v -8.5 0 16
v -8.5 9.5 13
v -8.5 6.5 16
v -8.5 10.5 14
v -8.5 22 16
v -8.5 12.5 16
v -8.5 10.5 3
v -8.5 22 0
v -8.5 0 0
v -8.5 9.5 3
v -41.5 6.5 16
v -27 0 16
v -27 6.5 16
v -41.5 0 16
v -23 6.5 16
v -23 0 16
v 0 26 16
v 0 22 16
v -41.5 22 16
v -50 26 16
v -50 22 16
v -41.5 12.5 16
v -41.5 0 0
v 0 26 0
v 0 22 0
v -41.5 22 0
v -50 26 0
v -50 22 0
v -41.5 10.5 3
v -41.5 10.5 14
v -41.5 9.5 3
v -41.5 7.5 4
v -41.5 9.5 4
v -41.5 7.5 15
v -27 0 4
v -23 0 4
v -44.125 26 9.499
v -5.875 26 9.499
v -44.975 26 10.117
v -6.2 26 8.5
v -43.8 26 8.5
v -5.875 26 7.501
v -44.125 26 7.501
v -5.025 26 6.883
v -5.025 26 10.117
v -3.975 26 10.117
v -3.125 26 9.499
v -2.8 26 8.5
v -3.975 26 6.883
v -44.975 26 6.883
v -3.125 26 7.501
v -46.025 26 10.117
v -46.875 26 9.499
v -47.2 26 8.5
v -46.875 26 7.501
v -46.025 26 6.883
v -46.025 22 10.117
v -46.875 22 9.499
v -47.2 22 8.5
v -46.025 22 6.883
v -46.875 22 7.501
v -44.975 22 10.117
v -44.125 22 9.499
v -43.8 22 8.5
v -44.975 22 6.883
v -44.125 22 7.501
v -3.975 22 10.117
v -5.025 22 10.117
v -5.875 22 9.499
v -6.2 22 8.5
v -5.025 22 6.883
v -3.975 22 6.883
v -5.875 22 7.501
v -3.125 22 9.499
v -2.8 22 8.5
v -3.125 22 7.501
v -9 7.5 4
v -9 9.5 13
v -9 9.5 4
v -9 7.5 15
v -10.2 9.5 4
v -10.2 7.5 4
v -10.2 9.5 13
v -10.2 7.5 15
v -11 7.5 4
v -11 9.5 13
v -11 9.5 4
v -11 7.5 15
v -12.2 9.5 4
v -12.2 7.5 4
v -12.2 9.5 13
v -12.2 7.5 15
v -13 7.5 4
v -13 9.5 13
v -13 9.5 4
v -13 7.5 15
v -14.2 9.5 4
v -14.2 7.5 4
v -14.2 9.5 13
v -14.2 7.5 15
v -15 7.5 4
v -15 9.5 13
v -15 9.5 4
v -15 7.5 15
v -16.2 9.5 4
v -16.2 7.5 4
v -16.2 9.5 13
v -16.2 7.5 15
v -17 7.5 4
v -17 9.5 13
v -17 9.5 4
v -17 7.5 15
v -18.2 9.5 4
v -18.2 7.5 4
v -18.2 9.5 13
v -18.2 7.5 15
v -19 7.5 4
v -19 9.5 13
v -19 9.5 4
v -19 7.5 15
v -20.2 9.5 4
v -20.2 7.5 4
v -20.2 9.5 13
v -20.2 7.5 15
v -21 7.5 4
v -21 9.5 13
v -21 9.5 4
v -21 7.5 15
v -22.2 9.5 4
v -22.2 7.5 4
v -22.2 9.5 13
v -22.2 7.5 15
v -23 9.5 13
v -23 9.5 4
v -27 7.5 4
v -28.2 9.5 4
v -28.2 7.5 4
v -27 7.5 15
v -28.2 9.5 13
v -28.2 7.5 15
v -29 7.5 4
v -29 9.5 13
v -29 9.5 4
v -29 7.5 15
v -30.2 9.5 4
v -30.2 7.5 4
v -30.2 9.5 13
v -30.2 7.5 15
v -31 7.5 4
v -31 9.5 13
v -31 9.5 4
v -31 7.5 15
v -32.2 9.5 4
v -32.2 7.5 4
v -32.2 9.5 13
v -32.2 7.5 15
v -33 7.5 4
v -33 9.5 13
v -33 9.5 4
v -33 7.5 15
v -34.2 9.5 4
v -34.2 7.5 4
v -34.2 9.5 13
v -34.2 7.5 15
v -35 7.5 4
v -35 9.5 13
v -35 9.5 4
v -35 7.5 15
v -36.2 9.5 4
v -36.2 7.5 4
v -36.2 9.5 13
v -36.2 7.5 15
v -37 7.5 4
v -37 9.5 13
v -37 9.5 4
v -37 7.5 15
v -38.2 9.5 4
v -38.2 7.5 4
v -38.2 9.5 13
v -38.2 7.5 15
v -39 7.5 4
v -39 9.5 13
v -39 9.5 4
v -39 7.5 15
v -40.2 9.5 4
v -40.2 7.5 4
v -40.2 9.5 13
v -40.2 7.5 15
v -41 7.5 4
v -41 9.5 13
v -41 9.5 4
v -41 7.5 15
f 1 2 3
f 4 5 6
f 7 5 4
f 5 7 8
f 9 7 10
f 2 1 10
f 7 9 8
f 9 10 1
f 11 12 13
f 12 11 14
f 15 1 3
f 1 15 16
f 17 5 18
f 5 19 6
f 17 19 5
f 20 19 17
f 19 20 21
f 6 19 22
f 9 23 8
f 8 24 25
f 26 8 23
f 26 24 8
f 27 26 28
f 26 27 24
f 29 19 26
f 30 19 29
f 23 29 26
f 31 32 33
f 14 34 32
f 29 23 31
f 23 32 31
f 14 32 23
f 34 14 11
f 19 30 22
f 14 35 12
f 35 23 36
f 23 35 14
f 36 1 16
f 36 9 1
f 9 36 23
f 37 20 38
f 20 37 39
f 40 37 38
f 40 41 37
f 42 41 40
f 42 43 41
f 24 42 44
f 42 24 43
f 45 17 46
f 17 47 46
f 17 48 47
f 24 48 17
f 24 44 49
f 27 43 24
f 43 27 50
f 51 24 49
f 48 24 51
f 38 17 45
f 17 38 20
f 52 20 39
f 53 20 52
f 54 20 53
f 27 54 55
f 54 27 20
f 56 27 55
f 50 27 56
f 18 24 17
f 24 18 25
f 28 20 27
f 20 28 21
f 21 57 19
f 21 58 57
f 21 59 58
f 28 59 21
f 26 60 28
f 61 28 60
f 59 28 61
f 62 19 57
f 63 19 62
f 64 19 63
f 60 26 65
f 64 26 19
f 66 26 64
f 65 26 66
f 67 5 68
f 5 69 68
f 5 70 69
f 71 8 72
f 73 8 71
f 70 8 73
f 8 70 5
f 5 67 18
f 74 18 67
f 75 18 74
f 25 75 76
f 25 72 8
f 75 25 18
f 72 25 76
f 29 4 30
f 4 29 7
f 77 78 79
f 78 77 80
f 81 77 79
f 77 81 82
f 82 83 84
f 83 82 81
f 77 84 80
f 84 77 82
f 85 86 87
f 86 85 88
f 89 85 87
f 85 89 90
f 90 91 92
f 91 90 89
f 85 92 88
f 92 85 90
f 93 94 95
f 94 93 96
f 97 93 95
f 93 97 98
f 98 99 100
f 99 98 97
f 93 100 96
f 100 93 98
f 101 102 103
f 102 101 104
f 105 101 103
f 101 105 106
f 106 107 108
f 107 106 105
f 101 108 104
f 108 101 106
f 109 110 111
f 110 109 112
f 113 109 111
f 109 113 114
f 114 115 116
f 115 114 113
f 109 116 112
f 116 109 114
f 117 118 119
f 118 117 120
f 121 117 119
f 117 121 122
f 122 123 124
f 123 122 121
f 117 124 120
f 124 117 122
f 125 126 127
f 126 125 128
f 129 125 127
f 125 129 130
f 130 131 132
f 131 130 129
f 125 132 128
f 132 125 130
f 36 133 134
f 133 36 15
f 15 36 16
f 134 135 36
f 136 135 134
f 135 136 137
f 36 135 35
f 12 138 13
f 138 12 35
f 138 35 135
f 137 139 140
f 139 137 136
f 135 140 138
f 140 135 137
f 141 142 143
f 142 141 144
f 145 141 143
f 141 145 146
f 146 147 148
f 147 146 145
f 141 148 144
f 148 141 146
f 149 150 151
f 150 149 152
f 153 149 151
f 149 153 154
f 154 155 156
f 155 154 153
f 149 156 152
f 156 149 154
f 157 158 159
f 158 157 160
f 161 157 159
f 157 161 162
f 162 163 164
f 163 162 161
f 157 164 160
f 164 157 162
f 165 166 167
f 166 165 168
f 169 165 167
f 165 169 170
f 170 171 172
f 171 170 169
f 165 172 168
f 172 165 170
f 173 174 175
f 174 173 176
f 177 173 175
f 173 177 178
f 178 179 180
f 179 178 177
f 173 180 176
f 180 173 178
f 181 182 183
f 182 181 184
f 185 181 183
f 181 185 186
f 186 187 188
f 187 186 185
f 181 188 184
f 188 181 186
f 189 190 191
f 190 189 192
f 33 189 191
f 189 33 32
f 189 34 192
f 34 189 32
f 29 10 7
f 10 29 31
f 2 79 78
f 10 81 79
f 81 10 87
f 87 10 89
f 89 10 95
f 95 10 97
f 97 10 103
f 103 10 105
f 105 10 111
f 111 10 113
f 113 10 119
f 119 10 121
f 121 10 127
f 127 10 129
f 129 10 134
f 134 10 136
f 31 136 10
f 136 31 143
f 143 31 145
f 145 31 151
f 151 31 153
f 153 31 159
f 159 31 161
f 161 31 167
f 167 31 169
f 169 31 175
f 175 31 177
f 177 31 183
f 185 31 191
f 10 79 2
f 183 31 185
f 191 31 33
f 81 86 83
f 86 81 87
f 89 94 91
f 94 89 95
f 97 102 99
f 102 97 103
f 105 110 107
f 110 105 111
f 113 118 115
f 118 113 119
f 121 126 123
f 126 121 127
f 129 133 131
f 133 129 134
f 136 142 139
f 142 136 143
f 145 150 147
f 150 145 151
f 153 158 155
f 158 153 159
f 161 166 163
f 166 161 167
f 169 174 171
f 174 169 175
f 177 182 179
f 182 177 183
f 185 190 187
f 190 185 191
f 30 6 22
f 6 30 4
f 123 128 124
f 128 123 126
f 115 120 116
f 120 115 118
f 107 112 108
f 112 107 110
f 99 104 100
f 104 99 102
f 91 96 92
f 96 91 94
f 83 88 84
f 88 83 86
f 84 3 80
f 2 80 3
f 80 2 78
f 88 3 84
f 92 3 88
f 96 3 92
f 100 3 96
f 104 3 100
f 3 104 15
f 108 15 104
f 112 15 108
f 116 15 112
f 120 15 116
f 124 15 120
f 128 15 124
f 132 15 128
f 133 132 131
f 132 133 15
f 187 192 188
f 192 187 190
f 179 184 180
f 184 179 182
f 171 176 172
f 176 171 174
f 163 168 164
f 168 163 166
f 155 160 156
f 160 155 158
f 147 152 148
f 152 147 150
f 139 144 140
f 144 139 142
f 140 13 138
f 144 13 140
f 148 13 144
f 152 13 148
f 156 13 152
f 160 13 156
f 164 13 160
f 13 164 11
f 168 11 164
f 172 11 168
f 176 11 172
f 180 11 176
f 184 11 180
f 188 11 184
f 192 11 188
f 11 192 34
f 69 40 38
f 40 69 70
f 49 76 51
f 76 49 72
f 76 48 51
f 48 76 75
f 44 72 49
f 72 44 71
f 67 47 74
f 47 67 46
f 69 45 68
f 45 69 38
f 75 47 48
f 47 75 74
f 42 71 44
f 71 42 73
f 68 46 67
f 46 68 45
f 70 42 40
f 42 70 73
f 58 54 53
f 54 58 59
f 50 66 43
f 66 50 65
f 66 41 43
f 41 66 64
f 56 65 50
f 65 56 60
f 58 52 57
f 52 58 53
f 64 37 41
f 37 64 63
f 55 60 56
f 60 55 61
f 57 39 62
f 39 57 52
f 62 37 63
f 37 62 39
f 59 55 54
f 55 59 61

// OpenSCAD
// file: ../configuration.scad
x_rod_distance = 45;

layer_height = 0.3;
layer_width = 2.2 * layer_height;

// Select your belt type ******************************************************

//T2.5
//belt_tooth_distance = 2.5;
//belt_tooth_ratio = 0.5;

//GT2
belt_tooth_distance = 2;
belt_tooth_ratio = 0.5;

//T5 (strongly discouraged)
//belt_tooth_distance = 5;
//belt_tooth_ratio = 0.75;

//HTD3
//belt_tooth_distance = 3;
//belt_tooth_ratio = 0.75;

//MXL
//belt_tooth_distance = 2.032;
//belt_tooth_ratio = 0.64;

// Select your bearing type ******************************************************

// 0 = 608, 1 = 624
bearing_x_idler = 0;
bearing_y_idler = 0;

// Select your hot-end mount ******************************************************

// 0 = none; 1 = groove-mount (J-head/MakerGear etc.)
hotend_mount = 1;

hotend_groovemount_depth = 5;
hotend_groovemount_diameter = 16;

// Select your z endstop type ******************************************************

// 0 = none; 1 = mechanical switch; 2 = hall effect switch
z_endstop_type = 1;
// main file
// PRUSA iteration3
// Y belt holder
// GNU GPL v3
// Josef Průša <iam@josefprusa.cz> and contributors
// http://www.reprap.org/wiki/Prusa_Mendel
// http://prusamendel.org

include <../configuration.scad>

module belt_holder_base(){
 translate([-33-8.5,0,-1]) cube([33,15,16]); 
 translate([-33-8.5,11,-1]) cube([33,15,16]);
 translate([-50,22,-1]) cube([50,4,16]);	
}

module belt_holder_beltcut(){
 position_tweak=-0.2;
 // Belt slit
 translate([-66,-0.5+10,belt_tooth_distance]) cube([67,1,15]);
 // Smooth insert cutout
 translate([-66,-0.5+10,12]) rotate([45,0,0]) cube([67,15,15]);
 // Individual teeth
 for ( i = [0 : 23] ){
  translate([0-i*belt_tooth_distance+position_tweak,-0.5+8,3]) cube([belt_tooth_distance*belt_tooth_ratio+0.2,3,15]);
 }
 // Middle opening
 translate([-2-25,-1,3]) cube([4,11,15]);	
}

module belt_holder_holes(){
 translate([-4.5,0,7.5]) rotate([-90,0,0]) cylinder(h=30, r=1.7, $fn=10);
 translate([-45.5,0,7.5]) rotate([-90,0,0]) cylinder(h=30, r=1.7, $fn=10);
}

// Final part
module belt_holder(){
 translate([0,0,1]) difference(){
  belt_holder_base();
  belt_holder_beltcut();
  belt_holder_holes();
 }
}

belt_holder();
